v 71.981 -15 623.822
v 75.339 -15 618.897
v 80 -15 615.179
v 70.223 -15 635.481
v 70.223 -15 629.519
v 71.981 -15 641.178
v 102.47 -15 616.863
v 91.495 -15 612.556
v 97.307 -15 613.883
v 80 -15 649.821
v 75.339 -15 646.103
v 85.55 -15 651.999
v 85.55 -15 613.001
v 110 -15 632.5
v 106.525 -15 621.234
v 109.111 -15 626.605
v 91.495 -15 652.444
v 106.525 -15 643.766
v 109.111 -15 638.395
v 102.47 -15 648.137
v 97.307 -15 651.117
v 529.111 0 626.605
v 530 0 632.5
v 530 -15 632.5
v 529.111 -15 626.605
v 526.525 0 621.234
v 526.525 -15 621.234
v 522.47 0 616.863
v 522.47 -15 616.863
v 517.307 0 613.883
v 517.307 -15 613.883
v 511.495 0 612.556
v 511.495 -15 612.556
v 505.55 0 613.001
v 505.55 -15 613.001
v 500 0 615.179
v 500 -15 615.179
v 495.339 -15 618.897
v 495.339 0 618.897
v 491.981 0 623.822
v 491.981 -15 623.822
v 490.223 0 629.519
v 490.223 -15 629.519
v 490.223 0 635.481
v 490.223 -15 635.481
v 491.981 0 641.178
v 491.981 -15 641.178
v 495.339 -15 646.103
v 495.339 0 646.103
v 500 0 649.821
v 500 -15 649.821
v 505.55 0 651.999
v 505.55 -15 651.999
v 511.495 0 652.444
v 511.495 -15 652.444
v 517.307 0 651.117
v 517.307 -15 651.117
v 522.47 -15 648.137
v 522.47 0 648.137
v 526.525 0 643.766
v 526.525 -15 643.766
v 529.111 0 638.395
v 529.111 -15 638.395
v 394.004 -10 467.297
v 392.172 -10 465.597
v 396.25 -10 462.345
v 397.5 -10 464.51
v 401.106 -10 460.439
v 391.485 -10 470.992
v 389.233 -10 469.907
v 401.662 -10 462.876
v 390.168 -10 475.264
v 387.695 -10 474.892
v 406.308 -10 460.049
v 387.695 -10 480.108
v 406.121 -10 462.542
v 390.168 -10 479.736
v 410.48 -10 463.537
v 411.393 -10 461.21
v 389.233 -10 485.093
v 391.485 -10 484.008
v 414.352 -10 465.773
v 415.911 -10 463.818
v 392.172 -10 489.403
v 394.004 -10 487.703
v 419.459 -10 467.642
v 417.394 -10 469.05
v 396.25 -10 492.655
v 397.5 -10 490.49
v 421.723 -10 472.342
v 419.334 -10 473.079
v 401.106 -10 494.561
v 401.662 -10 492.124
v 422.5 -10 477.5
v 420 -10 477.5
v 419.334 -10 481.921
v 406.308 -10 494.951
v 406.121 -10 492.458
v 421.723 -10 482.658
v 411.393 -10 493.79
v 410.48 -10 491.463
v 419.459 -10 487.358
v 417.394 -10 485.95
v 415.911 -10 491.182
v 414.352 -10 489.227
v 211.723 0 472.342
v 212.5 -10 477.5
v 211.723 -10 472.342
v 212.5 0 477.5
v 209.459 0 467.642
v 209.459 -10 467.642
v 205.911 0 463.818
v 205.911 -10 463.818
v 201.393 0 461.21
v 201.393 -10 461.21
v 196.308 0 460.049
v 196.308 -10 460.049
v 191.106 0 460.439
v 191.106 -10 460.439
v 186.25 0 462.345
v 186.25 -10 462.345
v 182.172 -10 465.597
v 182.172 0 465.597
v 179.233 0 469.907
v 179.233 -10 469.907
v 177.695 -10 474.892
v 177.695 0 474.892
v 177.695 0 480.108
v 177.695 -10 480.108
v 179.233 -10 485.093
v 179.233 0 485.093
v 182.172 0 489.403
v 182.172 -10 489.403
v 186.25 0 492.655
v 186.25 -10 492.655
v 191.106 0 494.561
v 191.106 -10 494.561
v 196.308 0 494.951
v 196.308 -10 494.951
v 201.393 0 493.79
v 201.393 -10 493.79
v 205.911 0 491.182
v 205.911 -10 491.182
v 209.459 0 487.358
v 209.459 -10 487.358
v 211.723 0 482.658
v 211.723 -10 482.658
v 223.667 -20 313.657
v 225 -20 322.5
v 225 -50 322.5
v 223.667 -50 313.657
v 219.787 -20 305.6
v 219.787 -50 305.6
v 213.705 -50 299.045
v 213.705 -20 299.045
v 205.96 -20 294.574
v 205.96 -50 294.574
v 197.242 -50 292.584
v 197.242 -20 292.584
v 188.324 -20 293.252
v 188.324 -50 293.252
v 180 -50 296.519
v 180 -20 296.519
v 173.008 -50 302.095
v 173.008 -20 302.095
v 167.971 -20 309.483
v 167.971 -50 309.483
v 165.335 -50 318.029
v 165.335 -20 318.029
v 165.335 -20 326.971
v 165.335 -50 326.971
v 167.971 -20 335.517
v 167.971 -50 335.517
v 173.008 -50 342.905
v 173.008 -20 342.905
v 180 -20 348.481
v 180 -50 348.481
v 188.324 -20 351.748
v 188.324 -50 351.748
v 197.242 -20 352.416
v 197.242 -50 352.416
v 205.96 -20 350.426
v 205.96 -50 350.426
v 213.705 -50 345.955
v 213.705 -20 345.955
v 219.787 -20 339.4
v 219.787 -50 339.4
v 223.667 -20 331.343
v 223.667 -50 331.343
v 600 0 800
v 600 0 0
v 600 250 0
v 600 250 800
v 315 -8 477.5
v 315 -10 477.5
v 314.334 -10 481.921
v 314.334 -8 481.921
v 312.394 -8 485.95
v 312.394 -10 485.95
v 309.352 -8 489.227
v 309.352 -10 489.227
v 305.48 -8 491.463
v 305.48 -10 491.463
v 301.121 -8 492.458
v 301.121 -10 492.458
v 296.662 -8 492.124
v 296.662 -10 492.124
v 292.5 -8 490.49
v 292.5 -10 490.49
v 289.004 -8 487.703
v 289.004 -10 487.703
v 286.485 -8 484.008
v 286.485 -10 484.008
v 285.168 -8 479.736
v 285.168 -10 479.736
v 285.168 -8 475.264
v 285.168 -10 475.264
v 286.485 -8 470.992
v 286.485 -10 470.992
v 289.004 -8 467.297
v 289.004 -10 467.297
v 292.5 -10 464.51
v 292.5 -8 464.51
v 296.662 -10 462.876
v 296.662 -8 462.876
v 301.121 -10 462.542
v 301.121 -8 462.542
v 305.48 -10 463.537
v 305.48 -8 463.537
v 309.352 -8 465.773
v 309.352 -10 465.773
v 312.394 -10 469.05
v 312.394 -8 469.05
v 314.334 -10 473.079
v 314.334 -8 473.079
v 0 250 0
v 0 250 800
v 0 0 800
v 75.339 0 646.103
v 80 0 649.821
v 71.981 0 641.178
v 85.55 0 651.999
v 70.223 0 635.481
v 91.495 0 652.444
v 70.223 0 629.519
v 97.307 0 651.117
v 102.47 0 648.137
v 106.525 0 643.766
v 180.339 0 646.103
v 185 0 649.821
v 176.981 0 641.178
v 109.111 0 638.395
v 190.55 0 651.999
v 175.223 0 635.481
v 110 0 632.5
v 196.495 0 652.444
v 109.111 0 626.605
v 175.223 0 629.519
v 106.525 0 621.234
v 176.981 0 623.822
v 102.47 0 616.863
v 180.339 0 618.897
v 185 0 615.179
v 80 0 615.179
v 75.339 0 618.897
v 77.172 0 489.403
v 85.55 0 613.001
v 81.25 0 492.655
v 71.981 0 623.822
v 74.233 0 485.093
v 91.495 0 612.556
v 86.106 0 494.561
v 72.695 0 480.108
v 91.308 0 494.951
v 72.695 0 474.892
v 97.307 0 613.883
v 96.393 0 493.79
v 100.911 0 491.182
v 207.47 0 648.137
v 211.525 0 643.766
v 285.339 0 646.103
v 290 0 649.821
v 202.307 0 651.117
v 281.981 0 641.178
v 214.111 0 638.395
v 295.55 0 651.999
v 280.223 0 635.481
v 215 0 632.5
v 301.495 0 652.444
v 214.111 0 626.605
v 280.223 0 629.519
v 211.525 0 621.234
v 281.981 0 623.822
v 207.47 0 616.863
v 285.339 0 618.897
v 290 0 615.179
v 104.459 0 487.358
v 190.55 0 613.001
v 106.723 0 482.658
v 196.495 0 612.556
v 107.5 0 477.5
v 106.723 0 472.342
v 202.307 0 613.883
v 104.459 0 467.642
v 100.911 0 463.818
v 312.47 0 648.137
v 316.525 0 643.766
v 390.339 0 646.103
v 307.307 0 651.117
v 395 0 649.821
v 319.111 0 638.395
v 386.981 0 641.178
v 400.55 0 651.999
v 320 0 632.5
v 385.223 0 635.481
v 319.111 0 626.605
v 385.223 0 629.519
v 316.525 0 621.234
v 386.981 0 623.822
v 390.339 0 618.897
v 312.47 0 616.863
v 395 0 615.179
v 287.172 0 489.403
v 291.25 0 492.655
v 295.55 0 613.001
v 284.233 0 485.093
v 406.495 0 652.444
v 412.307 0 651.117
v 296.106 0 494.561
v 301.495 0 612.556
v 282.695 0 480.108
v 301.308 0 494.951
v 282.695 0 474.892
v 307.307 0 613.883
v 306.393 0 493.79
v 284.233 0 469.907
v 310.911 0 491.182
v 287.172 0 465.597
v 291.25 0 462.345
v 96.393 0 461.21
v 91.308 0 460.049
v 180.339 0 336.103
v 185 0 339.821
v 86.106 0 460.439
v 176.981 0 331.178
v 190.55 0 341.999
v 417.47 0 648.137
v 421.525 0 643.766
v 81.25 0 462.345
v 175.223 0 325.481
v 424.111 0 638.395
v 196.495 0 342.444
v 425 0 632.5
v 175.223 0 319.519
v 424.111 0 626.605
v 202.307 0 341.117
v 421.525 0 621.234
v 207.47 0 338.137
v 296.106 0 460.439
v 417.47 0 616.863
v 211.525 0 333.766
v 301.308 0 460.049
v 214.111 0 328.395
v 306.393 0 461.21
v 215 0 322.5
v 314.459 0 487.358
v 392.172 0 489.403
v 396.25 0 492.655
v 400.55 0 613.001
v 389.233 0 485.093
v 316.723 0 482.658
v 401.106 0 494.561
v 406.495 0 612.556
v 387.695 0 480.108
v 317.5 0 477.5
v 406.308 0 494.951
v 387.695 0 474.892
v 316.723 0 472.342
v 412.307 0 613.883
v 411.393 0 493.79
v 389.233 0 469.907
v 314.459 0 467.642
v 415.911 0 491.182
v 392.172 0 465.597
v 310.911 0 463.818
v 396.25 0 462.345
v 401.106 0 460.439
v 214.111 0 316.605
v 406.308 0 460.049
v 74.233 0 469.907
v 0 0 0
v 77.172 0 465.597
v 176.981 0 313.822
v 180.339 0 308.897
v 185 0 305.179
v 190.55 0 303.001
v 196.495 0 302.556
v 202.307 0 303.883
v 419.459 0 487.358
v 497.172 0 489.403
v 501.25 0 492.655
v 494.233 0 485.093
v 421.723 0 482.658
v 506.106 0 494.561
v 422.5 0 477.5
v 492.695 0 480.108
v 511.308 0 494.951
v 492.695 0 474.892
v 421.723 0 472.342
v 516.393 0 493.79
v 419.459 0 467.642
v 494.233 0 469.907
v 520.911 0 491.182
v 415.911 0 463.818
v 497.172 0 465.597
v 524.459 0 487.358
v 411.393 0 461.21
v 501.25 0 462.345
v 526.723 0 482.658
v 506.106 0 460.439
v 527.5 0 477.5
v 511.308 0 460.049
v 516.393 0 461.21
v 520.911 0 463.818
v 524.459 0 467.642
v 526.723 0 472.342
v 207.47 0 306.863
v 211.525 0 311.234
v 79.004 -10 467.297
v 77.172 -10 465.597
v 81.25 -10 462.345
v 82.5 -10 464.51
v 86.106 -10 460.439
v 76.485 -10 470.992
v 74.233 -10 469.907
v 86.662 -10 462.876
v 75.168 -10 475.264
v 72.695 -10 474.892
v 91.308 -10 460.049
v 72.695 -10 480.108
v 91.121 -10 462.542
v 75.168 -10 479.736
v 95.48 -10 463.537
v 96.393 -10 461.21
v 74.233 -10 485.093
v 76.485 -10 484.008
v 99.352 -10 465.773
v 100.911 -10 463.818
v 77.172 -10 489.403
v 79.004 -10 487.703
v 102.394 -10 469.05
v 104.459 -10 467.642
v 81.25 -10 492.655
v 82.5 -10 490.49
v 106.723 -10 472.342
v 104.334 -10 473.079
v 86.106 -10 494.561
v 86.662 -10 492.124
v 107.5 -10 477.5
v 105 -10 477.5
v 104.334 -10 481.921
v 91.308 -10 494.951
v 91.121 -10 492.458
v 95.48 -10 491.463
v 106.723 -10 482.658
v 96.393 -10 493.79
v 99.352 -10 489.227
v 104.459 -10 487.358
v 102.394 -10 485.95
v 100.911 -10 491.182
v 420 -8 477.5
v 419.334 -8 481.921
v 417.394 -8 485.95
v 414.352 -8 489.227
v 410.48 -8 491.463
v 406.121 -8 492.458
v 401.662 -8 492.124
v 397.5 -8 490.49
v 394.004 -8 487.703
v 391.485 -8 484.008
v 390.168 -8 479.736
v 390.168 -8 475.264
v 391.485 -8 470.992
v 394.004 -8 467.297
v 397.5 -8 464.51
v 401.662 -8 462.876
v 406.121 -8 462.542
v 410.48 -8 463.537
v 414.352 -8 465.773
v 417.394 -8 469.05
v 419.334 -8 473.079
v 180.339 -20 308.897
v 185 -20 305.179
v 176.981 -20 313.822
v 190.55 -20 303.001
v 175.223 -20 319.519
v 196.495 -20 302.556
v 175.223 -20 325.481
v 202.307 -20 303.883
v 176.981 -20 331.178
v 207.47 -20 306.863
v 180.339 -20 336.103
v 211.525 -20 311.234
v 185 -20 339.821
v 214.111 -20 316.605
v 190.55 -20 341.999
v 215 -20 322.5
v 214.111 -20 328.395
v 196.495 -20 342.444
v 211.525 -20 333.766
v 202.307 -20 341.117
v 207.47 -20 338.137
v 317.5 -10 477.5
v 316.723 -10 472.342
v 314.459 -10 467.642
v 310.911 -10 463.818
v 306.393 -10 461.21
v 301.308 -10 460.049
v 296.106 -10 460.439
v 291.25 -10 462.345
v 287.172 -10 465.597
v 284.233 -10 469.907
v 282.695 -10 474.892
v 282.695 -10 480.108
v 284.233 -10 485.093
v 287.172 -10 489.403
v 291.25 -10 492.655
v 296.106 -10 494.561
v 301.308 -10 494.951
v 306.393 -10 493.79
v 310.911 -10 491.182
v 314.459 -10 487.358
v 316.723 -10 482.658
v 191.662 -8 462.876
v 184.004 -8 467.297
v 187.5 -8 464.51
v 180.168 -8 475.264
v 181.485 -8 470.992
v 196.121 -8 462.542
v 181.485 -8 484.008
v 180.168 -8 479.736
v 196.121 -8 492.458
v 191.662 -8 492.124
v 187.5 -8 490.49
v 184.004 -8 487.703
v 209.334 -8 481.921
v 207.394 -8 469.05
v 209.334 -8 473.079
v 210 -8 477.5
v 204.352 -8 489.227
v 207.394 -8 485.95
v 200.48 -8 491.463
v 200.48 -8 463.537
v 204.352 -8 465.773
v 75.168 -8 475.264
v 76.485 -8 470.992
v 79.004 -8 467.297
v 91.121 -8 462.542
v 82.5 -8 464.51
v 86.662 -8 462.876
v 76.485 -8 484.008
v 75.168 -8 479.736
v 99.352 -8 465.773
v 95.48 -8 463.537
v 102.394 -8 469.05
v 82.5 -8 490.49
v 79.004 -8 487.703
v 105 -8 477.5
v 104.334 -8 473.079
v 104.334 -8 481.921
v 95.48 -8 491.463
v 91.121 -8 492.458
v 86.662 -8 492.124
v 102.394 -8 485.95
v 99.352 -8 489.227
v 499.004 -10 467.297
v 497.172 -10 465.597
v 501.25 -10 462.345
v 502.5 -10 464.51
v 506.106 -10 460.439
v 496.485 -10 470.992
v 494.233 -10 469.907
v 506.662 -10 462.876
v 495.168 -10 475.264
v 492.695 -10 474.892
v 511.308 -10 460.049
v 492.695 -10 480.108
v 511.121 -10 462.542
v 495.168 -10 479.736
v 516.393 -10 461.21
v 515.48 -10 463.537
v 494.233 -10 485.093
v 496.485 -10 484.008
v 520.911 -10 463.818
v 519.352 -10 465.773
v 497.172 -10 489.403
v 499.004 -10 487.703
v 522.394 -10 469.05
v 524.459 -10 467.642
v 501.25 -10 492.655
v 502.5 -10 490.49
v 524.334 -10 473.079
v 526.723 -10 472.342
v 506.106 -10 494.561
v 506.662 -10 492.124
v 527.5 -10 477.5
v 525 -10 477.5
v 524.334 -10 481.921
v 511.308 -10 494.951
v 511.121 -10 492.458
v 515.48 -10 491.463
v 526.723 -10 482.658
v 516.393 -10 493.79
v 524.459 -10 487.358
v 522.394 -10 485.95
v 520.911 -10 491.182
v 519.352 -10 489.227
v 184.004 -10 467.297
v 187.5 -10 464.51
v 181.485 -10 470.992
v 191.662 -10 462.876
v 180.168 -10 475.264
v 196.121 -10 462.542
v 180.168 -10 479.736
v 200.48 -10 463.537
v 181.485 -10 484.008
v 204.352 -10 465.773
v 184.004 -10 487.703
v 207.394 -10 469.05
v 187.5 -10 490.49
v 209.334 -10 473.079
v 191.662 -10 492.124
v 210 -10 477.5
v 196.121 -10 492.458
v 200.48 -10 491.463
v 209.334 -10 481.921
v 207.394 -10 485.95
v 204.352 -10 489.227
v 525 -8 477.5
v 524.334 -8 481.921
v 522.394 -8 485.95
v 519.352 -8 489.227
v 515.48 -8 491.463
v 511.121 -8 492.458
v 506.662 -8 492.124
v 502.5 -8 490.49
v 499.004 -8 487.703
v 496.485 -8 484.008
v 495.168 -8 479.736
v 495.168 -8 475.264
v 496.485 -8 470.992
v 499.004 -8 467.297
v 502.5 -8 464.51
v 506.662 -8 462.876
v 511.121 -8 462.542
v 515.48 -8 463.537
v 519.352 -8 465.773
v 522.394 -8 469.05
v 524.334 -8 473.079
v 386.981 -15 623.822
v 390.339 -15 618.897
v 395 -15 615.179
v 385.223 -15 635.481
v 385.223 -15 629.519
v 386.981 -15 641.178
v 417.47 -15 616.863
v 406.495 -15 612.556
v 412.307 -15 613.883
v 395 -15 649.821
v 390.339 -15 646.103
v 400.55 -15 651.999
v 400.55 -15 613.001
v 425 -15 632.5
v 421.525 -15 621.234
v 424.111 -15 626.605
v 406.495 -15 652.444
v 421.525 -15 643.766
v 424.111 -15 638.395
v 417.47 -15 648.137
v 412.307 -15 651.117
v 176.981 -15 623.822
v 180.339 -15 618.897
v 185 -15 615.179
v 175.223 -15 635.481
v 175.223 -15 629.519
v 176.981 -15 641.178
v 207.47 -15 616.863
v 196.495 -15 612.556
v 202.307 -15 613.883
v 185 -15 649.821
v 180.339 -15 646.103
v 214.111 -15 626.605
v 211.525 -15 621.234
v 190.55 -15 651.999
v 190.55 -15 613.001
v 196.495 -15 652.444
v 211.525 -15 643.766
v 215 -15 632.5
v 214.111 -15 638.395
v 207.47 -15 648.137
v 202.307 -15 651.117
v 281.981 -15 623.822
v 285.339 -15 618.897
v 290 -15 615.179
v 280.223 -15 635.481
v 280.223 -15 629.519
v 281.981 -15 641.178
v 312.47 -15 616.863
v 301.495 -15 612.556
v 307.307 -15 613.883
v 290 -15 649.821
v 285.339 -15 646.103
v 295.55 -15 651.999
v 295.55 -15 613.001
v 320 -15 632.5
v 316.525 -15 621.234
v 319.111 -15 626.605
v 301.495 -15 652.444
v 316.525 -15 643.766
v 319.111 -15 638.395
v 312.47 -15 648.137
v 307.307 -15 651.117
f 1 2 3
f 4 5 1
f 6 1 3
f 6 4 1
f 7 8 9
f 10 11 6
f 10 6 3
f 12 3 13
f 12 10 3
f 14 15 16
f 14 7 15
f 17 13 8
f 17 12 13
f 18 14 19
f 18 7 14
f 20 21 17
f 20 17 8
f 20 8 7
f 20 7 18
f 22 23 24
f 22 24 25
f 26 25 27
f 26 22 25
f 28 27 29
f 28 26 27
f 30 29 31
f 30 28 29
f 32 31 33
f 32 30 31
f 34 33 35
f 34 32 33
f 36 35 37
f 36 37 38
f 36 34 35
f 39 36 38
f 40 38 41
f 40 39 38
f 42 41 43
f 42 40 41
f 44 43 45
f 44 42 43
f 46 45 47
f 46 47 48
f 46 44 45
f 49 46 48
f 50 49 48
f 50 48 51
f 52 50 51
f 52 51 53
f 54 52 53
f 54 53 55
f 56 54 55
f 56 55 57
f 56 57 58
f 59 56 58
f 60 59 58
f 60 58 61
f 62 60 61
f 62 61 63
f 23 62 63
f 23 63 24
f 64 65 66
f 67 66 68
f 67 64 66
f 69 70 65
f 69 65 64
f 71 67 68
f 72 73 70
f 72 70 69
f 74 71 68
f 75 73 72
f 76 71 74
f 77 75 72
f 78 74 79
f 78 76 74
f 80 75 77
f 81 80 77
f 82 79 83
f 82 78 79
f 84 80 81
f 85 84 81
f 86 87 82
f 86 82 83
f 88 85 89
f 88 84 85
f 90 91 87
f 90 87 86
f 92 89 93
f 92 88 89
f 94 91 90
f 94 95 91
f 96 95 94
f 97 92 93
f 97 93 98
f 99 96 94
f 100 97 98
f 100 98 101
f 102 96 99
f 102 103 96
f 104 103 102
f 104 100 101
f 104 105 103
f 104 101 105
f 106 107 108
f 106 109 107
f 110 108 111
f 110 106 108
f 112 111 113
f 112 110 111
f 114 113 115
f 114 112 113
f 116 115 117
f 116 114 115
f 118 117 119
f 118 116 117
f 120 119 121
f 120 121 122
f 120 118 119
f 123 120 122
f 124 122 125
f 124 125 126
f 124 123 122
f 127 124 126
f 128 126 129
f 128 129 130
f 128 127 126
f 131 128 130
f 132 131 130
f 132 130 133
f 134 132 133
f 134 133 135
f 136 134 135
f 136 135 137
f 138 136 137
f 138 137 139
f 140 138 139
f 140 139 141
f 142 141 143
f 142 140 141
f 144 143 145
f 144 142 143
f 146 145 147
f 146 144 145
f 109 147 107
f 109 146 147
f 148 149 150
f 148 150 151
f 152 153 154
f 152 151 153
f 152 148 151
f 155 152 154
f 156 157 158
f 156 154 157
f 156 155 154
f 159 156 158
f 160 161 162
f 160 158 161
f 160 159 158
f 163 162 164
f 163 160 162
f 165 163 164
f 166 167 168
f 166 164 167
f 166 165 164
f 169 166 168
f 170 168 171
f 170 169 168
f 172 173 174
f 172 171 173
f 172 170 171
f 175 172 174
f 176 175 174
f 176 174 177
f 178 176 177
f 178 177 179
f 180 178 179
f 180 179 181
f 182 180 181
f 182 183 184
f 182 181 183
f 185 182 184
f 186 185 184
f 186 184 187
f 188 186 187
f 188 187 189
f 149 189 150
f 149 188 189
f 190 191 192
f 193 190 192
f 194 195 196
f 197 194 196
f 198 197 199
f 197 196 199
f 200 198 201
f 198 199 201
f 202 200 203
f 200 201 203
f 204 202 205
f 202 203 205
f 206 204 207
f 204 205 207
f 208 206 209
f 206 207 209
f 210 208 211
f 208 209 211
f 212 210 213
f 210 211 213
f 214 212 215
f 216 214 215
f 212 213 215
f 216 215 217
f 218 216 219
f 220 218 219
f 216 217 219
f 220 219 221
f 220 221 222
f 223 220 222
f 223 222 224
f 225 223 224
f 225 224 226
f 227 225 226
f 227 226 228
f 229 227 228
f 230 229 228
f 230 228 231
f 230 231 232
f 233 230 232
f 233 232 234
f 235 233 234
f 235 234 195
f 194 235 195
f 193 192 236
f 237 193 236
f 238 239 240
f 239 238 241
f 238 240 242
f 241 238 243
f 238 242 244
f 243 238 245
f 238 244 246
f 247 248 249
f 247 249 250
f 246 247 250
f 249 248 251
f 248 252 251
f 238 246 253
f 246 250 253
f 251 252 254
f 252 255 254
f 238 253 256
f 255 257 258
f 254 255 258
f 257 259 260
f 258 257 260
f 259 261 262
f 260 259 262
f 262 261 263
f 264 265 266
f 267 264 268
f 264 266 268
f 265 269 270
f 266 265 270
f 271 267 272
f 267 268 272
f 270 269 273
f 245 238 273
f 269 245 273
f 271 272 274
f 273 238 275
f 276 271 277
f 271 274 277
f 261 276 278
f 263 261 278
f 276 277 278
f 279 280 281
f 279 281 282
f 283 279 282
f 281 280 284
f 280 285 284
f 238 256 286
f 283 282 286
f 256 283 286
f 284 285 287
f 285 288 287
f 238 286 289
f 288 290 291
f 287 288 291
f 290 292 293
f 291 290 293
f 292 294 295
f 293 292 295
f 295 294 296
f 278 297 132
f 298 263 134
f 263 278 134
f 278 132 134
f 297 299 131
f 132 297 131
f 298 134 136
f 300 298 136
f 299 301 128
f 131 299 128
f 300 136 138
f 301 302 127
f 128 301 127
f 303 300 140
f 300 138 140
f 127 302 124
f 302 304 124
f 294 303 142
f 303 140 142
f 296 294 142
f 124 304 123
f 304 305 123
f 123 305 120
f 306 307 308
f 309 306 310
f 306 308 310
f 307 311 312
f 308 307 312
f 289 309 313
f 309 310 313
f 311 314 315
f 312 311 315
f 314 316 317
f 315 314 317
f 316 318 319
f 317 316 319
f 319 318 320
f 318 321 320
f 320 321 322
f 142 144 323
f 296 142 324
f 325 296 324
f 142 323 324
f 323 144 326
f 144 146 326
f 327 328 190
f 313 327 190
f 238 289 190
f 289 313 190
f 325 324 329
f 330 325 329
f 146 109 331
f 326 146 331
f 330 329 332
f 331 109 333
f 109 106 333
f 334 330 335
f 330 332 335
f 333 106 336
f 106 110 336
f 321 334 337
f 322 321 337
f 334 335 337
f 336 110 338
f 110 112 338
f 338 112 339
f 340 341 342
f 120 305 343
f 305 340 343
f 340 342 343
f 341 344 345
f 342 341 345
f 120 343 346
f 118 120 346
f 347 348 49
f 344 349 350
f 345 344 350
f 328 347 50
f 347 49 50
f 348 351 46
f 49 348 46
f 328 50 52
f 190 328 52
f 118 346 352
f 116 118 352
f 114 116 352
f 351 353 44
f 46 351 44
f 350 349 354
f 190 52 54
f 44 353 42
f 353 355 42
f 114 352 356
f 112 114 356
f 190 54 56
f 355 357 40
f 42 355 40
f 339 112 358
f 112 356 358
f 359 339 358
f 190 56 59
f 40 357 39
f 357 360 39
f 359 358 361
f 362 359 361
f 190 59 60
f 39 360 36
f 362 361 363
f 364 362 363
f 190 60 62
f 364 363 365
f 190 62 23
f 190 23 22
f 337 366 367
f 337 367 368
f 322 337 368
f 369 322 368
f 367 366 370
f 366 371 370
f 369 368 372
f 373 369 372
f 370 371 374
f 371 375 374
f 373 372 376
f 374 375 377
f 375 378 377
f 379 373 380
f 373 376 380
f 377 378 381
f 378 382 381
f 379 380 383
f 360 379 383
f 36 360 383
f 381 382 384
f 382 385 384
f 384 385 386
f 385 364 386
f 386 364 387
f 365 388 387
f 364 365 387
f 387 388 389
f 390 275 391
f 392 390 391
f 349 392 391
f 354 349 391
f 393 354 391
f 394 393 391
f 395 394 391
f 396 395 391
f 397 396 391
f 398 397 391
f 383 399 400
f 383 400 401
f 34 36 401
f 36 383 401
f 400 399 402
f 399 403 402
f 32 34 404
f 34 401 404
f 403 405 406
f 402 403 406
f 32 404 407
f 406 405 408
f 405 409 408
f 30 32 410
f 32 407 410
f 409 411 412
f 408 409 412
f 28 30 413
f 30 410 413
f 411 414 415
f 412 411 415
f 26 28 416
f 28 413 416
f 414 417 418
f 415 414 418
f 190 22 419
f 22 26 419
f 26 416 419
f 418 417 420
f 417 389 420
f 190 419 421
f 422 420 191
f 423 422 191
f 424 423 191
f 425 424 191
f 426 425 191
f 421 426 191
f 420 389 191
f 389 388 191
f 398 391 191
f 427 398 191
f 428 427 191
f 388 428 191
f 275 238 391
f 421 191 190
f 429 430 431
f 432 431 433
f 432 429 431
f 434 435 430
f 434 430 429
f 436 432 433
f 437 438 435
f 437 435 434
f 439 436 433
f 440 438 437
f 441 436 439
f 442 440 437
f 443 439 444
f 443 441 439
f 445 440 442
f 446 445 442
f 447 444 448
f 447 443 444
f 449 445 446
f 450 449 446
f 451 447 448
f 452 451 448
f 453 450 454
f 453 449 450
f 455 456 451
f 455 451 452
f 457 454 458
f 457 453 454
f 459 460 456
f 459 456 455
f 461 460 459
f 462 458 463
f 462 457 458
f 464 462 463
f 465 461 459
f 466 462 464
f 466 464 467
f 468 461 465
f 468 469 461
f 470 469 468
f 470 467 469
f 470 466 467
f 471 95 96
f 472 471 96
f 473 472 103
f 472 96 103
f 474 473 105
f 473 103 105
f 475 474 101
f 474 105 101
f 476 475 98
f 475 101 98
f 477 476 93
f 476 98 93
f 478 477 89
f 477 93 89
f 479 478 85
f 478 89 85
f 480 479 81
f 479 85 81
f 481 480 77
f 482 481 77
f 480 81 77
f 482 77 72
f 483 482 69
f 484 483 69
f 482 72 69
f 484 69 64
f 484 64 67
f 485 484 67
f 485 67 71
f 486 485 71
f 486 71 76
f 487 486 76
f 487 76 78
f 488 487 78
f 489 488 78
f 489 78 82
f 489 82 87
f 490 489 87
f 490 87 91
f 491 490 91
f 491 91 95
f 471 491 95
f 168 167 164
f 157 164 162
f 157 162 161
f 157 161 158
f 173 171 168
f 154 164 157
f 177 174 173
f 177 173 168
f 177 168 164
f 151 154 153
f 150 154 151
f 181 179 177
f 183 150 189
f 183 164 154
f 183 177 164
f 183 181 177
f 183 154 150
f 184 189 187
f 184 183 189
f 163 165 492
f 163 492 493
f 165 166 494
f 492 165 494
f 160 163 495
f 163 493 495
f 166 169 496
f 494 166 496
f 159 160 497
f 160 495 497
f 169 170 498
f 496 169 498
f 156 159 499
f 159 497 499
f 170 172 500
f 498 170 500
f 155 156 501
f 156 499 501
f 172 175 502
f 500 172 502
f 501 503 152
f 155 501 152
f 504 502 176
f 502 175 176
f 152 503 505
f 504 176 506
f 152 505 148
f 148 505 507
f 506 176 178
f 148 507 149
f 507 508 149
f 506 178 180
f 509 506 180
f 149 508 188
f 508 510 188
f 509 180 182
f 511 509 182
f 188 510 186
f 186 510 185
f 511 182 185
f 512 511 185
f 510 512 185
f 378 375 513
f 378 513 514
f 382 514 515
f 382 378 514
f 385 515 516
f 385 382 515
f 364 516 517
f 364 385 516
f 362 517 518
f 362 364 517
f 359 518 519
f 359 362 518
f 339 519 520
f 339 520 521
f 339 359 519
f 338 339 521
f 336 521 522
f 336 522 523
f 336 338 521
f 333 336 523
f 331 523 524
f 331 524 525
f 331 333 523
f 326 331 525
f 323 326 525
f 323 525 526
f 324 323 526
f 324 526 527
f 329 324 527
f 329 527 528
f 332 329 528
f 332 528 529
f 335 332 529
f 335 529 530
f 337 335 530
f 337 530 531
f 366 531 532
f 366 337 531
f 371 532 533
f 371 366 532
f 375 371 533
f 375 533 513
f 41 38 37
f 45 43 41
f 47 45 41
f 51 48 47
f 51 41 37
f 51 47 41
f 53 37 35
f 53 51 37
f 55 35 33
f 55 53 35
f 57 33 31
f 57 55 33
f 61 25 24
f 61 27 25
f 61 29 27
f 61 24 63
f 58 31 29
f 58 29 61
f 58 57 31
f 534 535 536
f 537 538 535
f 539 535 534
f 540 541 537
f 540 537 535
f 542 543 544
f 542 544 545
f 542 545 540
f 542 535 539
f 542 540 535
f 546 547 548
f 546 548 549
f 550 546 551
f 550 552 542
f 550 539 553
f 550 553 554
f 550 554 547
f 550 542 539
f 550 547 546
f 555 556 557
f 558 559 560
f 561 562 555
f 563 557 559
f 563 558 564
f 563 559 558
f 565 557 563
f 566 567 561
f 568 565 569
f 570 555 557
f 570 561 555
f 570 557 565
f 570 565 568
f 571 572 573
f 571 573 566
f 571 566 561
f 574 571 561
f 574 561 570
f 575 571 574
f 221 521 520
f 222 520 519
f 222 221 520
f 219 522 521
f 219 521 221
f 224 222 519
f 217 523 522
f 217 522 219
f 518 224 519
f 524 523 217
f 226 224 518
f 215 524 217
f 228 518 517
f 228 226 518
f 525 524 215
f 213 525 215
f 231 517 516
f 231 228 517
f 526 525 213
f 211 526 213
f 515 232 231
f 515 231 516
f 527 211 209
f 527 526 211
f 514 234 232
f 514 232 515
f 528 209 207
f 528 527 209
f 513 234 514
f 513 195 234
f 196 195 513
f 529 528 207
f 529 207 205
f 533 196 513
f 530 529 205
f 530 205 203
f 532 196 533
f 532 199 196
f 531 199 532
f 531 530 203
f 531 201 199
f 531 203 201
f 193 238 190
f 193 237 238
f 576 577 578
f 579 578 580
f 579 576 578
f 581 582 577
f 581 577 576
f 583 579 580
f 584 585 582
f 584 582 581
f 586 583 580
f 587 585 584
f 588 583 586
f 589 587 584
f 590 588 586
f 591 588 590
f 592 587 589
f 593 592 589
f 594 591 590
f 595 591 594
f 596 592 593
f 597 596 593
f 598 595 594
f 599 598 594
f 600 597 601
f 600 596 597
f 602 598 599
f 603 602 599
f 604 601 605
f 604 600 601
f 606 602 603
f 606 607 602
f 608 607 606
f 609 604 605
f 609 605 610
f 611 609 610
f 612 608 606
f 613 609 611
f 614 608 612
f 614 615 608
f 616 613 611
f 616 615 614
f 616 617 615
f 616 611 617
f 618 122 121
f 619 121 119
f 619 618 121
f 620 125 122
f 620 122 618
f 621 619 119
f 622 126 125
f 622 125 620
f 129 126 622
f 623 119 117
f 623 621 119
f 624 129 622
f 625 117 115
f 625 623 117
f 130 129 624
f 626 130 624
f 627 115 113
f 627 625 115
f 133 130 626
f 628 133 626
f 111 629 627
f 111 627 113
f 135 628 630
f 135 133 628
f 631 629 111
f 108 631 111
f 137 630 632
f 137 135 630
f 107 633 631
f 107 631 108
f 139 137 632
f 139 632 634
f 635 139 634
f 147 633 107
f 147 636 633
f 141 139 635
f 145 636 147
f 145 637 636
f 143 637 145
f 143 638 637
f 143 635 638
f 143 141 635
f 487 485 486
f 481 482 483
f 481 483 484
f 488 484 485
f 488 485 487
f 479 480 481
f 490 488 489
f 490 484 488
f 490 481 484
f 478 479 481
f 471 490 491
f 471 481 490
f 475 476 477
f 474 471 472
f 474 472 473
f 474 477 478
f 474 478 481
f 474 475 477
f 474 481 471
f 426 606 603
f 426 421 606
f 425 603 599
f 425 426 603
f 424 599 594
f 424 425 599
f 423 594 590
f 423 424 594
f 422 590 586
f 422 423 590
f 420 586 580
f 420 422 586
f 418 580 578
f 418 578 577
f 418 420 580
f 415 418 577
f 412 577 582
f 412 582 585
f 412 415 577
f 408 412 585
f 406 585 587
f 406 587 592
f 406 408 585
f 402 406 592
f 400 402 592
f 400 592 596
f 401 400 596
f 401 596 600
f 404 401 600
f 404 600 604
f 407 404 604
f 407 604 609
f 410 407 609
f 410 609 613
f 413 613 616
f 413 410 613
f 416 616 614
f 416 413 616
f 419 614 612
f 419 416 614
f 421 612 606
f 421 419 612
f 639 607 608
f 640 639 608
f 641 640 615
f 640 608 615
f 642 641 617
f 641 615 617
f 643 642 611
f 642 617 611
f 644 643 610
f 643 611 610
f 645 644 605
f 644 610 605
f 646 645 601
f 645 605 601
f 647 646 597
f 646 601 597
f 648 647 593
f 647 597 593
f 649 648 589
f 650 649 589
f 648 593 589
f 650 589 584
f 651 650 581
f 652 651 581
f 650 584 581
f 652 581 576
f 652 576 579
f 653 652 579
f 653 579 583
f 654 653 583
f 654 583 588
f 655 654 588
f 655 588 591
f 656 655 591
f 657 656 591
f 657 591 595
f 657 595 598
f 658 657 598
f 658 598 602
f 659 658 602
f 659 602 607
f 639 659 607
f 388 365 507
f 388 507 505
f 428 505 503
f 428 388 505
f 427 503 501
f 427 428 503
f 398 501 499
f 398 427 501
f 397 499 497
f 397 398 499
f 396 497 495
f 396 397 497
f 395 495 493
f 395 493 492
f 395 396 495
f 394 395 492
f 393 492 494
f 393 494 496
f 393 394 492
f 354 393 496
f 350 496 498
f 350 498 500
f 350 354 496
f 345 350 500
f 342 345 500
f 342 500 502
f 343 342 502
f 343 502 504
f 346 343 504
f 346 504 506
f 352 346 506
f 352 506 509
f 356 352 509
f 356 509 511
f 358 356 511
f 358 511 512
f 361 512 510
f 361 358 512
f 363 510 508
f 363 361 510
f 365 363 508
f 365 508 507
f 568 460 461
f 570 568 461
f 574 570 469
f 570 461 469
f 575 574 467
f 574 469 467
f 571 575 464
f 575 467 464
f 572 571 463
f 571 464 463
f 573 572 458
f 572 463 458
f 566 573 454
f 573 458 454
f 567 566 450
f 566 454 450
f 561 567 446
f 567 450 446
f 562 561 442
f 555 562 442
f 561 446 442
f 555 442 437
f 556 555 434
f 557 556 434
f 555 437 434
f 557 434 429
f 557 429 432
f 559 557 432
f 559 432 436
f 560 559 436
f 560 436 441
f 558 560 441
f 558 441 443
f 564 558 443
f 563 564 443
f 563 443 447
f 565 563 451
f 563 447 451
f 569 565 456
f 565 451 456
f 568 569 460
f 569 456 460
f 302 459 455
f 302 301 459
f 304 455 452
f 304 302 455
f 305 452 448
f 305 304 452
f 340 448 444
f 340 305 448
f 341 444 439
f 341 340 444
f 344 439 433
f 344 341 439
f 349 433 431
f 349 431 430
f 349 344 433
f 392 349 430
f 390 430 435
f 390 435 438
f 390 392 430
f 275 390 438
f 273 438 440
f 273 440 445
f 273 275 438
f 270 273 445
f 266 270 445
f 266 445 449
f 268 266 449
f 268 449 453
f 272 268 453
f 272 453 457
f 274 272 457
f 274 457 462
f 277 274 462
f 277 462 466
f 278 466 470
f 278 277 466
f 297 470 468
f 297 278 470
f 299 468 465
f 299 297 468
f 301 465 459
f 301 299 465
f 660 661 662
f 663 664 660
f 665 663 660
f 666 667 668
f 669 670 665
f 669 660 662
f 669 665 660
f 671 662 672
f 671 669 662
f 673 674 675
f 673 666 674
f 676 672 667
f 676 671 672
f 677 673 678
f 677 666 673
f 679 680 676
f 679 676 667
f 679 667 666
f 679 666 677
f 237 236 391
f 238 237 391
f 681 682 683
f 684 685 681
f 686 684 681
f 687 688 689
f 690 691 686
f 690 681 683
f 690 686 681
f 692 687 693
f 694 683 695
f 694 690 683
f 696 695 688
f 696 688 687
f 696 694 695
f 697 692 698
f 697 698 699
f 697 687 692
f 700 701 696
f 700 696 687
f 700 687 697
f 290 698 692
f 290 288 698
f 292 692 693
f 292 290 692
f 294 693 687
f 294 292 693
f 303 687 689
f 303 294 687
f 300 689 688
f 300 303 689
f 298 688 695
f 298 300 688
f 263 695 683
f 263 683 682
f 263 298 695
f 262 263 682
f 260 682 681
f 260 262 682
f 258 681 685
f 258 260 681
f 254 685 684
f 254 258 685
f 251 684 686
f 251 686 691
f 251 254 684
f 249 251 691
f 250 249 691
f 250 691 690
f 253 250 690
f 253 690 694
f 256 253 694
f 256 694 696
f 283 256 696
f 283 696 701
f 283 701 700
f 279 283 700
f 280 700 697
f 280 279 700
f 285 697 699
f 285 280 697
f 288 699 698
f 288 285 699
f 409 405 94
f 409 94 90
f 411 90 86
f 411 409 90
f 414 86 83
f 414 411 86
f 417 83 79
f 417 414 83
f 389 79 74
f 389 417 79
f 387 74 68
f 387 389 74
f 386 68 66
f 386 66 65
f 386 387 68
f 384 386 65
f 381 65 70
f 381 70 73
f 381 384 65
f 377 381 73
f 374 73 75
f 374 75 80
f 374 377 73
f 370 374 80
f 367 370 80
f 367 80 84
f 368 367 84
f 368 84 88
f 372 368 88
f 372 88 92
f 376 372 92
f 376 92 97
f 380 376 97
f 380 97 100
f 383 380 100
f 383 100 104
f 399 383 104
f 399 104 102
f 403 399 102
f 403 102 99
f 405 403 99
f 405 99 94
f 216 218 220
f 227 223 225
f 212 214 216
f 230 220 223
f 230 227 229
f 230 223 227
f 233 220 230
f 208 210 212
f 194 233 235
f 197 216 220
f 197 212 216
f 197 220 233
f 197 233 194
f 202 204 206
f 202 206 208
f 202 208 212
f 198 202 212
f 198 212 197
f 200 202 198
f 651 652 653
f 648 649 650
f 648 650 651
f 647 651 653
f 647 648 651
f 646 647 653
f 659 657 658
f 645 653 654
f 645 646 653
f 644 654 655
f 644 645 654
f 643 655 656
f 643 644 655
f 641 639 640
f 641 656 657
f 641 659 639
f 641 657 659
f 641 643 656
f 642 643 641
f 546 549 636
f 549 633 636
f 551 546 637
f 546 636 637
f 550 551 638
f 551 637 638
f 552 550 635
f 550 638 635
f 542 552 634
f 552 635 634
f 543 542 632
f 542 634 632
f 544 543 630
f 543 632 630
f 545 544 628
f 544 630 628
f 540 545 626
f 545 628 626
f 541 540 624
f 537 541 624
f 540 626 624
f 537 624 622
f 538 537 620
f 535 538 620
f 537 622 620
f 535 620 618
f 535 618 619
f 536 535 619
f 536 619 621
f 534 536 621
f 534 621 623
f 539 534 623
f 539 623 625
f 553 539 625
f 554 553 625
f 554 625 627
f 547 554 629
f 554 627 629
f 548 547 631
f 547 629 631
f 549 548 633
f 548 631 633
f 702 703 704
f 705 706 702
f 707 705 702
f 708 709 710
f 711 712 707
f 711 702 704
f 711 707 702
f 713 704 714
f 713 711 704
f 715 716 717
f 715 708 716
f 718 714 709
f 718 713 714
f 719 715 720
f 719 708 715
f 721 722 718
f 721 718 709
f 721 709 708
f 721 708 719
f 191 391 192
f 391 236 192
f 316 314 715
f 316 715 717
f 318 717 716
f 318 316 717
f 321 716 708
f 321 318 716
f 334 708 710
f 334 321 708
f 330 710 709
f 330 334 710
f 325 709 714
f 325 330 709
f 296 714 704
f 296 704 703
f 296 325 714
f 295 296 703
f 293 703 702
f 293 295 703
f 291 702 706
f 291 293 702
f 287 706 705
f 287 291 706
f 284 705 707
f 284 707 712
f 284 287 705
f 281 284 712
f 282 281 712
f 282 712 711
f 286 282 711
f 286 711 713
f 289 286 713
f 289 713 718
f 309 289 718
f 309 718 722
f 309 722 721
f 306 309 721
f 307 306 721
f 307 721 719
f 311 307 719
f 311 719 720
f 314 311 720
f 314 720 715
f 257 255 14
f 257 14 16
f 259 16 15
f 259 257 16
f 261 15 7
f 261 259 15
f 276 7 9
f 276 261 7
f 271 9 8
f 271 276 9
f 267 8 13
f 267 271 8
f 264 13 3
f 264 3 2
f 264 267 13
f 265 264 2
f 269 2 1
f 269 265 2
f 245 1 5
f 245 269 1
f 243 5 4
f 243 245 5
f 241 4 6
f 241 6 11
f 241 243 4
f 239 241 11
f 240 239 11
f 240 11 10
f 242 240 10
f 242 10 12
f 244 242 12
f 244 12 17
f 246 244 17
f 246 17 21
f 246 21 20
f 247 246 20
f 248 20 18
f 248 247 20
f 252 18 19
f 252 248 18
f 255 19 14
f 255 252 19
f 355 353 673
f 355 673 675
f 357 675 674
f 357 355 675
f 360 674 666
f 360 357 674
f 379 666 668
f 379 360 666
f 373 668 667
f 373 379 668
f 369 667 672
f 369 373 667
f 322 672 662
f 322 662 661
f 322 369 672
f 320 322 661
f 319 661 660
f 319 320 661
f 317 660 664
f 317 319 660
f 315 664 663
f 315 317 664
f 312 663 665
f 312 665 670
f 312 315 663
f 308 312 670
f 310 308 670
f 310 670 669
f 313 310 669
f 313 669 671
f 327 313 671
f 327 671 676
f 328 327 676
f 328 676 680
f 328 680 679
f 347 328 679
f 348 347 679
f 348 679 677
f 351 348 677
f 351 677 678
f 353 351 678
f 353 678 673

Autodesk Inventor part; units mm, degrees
ref_plane "YZ Plane" through (0, 0, 0) normal (1, 0, 0) x (0, 1, 0)
ref_plane "XZ Plane" through (0, 0, 0) normal (0, 1, 0) x (-1, 0, 0)
ref_plane "XY Plane" through (0, 0, 0) normal (0, 0, 1) x (1, 0, 0)
sketch "Sketch1" plane through (0, 0, 0) normal (0, 0, 1) x (1, 0, 0)
  line L0 (0, 0) -> (600, 0)
  line L1 (600, 0) -> (600, 250)
  line L2 (600, 250) -> (0, 250)
  line L3 (0, 250) -> (0, 0)
  dimension "d0" = 600
  dimension "d1" = 250
extrude "Extrusion1" add sketch "Sketch1" along normal blind 800
sketch "Sketch2" plane through (0, 0, 0) normal (0, -1, 0) x (1, 0, 0)
  line L0 (0, 0) -> (600, 0)
  line L1 (600, 0) -> (600, 800)
  line L2 (600, 800) -> (0, 800)
  line L3 (0, 800) -> (0, 0)
  line L4 (90, 710) -> (510, 710)
  line L5 (510, 710) -> (510, 90)
  line L6 (510, 90) -> (90, 90)
  line L7 (90, 90) -> (90, 710)
  line L8 (300, 710) -> (300, 90)
  line L9 (90, 400) -> (510, 400)
  line L10 (90, 710) -> (90, 400)
  line L11 (90, 400) -> (90, 90)
  line L12 (90, 555) -> (510, 555)
  line L13 (90, 245) -> (510, 245)
  line L14 (90, 710) -> (300, 710)
  line L15 (300, 710) -> (300, 555)
  line L16 (300, 555) -> (90, 555)
  line L17 (90, 555) -> (90, 710)
  line L18 (300, 555) -> (510, 555)
  line L19 (510, 555) -> (510, 710)
  line L20 (510, 710) -> (300, 710)
  line L21 (300, 710) -> (300, 555)
  line L22 (90, 555) -> (300, 555)
  line L23 (300, 555) -> (300, 400)
  line L24 (300, 400) -> (90, 400)
  line L25 (90, 400) -> (90, 555)
  line L26 (300, 400) -> (510, 400)
  line L27 (510, 400) -> (510, 555)
  line L28 (510, 555) -> (300, 555)
  line L29 (300, 555) -> (300, 400)
  line L30 (510, 400) -> (300, 400)
  line L31 (300, 400) -> (300, 245)
  line L32 (300, 245) -> (510, 245)
  line L33 (510, 245) -> (510, 400)
  line L34 (90, 400) -> (300, 400)
  line L35 (300, 400) -> (300, 245)
  line L36 (300, 245) -> (90, 245)
  line L37 (90, 245) -> (90, 400)
  line L38 (90, 90) -> (300, 90)
  line L39 (300, 90) -> (300, 245)
  line L40 (300, 245) -> (90, 245)
  line L41 (90, 245) -> (90, 90)
  line L42 (300, 245) -> (510, 245)
  line L43 (510, 245) -> (510, 90)
  line L44 (510, 90) -> (300, 90)
  line L45 (300, 90) -> (300, 245)
  line L46 (90, 632.5) -> (510, 632.5)
  line L47 (90, 477.5) -> (510, 477.5)
  line L48 (90, 322.5) -> (510, 322.5)
  line L49 (90, 167.5) -> (510, 167.5)
  line L50 (195, 710) -> (195, 90)
  line L51 (405, 710) -> (405, 90)
  circle A0 centre (195, 632.5) radius 20
  circle A1 centre (300, 632.5) radius 20
  circle A2 centre (405, 632.5) radius 20
  circle A3 centre (90, 632.5) radius 20
  circle A4 centre (510, 632.5) radius 20
  circle A5 centre (90, 477.5) radius 17.5
  circle A6 centre (195, 477.5) radius 17.5
  circle A7 centre (300, 477.5) radius 17.5
  circle A8 centre (405, 477.5) radius 17.5
  circle A9 centre (510, 477.5) radius 17.5
  circle A10 centre (195, 322.5) radius 20
  dimension "d4" = 90
  dimension "d5" = 40
  dimension "d6" = 40
  dimension "d7" = 40
  dimension "d8" = 40
  dimension "d9" = 40
  dimension "d10" = 35
  dimension "d11" = 35
  dimension "d12" = 35
  dimension "d13" = 35
  dimension "d14" = 35
  dimension "d15" = 40
extrude "Extrusion2" add sketch "Sketch2" along normal blind 15 contours A3 L46 L7 | L7 A3 | A0 L46 L50 | L50 L46 A0 | L46 A3 L7 | A1 L46 L8 | L8 L46 A1 | L50 A0 L46 | L46 A0 L50 | A2 L46 L51 | L51 L46 A2 | L46 A1 L8 | L8 A1 L46 | A4 L5 | L5 L46 A4 | L51 A2 L46 | L46 A2 L51 | L5 A4 L46
extrude "Extrusion3" add sketch "Sketch2" along normal blind 10 contours A5 L47 L7 | L7 A5 | L47 A5 L7 | A6 L47 L50 | L50 L47 A6 | L47 L50 A6 | A7 L47 L8 | L8 L47 A7 | L47 A6 L50 | L47 A7 L8 | L8 A7 L47 | A8 L47 L51 | L51 L47 A8 | L47 L51 A8 | A9 L5 | L5 L47 A9 | L47 A8 L51 | L5 A9 L47
extrude "Extrusion4" add sketch "Sketch2" along normal blind 20 contours A10 L50 L48 | L48 L50 A10 | A10 L48 L50 | L48 A10 L50
sketch "Sketch3" plane through (195, -10, 477.5) normal (0, -1, 0) x (1, 0, 0)
  circle A0 centre (-105, 0) radius 17.5 projected
  circle A1 centre (-105, 0) radius 15
  circle A2 centre (0, 0) radius 17.5 projected
  circle A3 centre (0, 0) radius 15
  circle A4 centre (105, 0) radius 17.5 projected
  circle A5 centre (105, 0) radius 15
  circle A6 centre (210, 0) radius 17.5 projected
  circle A7 centre (210, 0) radius 15
  circle A8 centre (315, 0) radius 17.5 projected
  circle A9 centre (315, 0) radius 15
  point P0 (-195, -477.5)
  dimension "d22" = 30
  dimension "d23" = 30
  dimension "d24" = 30
  dimension "d25" = 30
  dimension "d26" = 30
extrude "Extrusion5" cut sketch "Sketch3" against normal blind 2 contours A1 | A3 | A5 | A7 | A9
sketch "Sketch4" plane through (195, -20, 322.5) normal (0, -1, 0) x (1, 0, 0)
  circle A0 centre (0, 0) radius 30
  point P0 (-195, -322.5)
  dimension "d29" = 60
extrude "Extrusion6" add sketch "Sketch4" along normal blind 30
properties part number "ControlPanel"
